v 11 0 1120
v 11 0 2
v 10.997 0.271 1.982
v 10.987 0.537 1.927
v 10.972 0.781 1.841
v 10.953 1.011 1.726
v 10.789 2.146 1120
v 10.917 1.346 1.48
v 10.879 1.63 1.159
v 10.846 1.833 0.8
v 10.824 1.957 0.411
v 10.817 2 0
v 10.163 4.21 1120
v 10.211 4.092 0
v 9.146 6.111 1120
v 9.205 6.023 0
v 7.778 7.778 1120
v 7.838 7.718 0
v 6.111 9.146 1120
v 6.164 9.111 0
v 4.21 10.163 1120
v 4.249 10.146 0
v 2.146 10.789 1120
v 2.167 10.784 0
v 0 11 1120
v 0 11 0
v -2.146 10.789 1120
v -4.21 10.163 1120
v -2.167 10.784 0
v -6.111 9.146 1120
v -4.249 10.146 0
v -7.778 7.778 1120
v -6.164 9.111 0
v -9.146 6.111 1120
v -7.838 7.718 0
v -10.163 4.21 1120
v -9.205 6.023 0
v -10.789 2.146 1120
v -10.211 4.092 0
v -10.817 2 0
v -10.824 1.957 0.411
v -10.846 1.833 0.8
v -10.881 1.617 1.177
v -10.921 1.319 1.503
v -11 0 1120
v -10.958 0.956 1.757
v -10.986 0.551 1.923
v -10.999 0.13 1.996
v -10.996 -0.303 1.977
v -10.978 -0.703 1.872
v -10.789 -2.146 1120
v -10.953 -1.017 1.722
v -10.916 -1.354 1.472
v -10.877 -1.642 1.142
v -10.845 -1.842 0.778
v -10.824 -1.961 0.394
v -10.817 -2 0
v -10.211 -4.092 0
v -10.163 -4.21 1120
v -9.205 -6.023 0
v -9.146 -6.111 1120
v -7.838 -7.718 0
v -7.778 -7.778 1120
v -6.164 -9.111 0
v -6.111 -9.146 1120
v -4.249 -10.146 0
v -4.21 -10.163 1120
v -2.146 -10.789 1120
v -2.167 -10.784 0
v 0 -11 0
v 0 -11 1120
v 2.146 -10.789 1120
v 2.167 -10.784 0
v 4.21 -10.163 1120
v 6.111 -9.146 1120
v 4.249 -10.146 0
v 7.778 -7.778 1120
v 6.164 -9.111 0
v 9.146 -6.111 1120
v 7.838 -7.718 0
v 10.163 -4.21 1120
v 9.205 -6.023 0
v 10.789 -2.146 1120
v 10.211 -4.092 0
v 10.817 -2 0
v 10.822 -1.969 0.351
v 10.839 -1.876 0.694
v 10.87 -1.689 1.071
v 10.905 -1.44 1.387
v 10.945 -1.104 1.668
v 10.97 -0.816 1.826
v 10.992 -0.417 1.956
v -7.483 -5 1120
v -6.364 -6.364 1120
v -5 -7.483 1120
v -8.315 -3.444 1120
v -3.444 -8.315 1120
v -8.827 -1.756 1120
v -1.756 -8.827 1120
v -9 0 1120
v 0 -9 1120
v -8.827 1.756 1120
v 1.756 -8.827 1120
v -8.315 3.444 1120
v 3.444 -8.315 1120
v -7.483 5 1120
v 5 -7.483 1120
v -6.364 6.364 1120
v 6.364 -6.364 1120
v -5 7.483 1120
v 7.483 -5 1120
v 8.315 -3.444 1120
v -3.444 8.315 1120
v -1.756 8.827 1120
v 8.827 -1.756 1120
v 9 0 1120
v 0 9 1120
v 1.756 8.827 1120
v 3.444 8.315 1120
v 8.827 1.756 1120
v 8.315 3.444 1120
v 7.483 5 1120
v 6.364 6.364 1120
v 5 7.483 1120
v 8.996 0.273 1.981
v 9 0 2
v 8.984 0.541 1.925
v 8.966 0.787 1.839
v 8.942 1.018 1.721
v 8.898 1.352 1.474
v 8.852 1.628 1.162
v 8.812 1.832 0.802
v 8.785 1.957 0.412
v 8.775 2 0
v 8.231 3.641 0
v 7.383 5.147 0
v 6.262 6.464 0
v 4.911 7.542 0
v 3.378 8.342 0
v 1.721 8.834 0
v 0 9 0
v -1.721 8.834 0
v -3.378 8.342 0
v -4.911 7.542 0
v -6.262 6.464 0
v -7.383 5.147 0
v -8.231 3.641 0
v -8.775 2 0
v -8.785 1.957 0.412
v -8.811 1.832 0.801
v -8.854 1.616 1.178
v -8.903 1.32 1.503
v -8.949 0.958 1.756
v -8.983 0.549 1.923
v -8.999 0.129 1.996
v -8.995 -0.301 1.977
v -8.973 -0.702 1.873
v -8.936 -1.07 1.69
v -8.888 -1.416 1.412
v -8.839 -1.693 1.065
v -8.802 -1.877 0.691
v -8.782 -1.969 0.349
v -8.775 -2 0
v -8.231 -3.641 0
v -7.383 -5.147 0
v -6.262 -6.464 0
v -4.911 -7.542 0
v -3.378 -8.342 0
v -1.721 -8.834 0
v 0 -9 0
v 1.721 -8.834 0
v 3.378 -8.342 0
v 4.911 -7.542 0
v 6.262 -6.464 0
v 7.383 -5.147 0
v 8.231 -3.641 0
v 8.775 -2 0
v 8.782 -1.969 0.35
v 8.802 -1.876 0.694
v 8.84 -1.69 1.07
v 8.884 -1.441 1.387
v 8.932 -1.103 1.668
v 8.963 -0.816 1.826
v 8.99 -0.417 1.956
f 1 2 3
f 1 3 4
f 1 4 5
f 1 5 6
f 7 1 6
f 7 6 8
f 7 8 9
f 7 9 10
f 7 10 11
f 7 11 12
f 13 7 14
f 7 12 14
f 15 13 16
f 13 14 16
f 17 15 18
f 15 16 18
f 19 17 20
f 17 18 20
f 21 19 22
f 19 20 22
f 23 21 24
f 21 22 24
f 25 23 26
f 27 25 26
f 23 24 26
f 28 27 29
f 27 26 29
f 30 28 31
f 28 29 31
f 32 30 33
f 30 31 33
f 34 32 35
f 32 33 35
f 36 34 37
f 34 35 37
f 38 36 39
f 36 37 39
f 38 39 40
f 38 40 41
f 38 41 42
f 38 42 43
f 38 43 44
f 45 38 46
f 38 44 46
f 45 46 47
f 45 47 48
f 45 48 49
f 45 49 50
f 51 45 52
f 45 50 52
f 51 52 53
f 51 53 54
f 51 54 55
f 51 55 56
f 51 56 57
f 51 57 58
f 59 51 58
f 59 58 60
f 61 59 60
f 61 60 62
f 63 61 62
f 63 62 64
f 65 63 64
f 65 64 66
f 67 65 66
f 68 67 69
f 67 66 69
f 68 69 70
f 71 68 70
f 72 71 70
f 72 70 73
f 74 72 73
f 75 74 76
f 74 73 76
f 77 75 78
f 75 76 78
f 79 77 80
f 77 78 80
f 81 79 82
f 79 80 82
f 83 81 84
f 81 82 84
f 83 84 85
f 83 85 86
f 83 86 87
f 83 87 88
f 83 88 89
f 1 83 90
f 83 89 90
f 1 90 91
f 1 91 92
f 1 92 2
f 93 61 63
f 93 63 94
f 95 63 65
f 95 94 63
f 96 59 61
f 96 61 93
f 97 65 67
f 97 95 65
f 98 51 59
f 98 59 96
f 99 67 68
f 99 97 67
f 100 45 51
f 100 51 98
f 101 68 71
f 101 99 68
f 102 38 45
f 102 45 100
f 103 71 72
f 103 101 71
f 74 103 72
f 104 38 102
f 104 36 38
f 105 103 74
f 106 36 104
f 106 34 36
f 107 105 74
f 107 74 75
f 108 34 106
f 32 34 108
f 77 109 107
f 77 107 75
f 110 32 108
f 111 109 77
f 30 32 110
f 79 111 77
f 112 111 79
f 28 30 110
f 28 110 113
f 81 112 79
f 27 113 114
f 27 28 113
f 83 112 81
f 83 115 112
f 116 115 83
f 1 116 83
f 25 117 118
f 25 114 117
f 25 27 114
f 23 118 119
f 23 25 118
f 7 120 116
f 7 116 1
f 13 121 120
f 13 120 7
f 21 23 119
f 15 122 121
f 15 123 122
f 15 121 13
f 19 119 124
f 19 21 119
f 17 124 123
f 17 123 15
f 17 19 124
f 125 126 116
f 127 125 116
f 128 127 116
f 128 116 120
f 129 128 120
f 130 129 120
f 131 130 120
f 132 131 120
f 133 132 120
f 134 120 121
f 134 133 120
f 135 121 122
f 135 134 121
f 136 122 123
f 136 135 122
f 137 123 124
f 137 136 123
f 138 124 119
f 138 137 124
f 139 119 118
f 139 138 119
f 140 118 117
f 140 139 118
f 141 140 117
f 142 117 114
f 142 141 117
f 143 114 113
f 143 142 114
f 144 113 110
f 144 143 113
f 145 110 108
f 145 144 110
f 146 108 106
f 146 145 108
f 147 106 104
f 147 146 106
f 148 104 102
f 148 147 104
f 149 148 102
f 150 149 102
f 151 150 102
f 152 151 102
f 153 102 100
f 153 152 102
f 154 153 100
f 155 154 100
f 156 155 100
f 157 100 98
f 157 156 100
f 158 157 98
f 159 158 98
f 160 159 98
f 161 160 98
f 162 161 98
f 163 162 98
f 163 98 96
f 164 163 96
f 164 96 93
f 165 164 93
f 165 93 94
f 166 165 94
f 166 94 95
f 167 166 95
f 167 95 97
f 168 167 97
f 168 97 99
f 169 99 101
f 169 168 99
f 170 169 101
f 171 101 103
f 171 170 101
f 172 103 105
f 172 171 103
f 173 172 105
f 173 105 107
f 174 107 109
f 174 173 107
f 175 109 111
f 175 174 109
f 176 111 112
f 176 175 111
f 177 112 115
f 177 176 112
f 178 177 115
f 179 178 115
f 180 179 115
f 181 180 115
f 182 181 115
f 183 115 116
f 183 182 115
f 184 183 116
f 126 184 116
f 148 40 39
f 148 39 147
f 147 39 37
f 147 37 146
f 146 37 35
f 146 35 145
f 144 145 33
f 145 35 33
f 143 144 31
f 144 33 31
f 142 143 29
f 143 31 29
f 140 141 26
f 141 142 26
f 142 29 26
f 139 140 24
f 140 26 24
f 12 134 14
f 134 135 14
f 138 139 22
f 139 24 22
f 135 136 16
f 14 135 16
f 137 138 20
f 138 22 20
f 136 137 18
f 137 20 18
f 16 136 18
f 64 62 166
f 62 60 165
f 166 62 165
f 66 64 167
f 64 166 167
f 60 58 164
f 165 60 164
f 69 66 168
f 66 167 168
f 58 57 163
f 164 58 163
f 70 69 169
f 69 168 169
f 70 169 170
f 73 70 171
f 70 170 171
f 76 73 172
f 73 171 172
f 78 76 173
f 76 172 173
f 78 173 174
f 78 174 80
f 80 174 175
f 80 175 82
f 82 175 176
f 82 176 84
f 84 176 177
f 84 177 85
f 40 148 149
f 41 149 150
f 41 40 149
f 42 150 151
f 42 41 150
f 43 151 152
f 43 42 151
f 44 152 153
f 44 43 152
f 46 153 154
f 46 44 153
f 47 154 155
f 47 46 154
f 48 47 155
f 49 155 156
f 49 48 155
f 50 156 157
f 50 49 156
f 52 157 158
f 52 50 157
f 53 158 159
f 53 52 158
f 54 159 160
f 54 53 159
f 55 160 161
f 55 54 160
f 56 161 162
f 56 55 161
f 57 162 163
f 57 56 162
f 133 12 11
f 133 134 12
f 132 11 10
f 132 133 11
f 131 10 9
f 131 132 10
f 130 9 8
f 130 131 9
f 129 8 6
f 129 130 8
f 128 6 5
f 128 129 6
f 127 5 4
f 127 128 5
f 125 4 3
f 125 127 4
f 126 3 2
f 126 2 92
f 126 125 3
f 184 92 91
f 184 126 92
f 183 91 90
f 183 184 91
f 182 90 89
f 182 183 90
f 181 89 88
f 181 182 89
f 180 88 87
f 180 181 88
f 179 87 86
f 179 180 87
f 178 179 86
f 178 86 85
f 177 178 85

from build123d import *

# Parameters (mm, degrees)
CYLINDER002_R     = 2
CYLINDER002_DEPTH = 22
CYLINDER001_R     = 9
CYLINDER001_DEPTH = 1120
CYLINDER_R        = 11
CYLINDER_DEPTH    = 1120


with BuildPart() as cylinder002:
    # Cylinder002 → Cylinder002 (new body)
    with BuildSketch(Plane(origin=(-11, 0, 0), x_dir=(0, 0, -1), z_dir=(1, 0, 0))):
        Circle(CYLINDER002_R)
    extrude(amount=CYLINDER002_DEPTH)


with BuildPart() as cylinder001:
    # Cylinder001 → Cylinder001 (new body)
    with BuildSketch(Plane.XY):
        Circle(CYLINDER001_R)
    extrude(amount=CYLINDER001_DEPTH)


with BuildPart() as body:
    # Cylinder → Cylinder (new body)
    with BuildSketch(Plane.XY):
        Circle(CYLINDER_R)
    extrude(amount=CYLINDER_DEPTH)

    # Cut: cut Cylinder001
    add(cylinder001.part, mode=Mode.SUBTRACT)

    # Cut001: cut Cylinder002
    add(cylinder002.part, mode=Mode.SUBTRACT)


solid = body.part
